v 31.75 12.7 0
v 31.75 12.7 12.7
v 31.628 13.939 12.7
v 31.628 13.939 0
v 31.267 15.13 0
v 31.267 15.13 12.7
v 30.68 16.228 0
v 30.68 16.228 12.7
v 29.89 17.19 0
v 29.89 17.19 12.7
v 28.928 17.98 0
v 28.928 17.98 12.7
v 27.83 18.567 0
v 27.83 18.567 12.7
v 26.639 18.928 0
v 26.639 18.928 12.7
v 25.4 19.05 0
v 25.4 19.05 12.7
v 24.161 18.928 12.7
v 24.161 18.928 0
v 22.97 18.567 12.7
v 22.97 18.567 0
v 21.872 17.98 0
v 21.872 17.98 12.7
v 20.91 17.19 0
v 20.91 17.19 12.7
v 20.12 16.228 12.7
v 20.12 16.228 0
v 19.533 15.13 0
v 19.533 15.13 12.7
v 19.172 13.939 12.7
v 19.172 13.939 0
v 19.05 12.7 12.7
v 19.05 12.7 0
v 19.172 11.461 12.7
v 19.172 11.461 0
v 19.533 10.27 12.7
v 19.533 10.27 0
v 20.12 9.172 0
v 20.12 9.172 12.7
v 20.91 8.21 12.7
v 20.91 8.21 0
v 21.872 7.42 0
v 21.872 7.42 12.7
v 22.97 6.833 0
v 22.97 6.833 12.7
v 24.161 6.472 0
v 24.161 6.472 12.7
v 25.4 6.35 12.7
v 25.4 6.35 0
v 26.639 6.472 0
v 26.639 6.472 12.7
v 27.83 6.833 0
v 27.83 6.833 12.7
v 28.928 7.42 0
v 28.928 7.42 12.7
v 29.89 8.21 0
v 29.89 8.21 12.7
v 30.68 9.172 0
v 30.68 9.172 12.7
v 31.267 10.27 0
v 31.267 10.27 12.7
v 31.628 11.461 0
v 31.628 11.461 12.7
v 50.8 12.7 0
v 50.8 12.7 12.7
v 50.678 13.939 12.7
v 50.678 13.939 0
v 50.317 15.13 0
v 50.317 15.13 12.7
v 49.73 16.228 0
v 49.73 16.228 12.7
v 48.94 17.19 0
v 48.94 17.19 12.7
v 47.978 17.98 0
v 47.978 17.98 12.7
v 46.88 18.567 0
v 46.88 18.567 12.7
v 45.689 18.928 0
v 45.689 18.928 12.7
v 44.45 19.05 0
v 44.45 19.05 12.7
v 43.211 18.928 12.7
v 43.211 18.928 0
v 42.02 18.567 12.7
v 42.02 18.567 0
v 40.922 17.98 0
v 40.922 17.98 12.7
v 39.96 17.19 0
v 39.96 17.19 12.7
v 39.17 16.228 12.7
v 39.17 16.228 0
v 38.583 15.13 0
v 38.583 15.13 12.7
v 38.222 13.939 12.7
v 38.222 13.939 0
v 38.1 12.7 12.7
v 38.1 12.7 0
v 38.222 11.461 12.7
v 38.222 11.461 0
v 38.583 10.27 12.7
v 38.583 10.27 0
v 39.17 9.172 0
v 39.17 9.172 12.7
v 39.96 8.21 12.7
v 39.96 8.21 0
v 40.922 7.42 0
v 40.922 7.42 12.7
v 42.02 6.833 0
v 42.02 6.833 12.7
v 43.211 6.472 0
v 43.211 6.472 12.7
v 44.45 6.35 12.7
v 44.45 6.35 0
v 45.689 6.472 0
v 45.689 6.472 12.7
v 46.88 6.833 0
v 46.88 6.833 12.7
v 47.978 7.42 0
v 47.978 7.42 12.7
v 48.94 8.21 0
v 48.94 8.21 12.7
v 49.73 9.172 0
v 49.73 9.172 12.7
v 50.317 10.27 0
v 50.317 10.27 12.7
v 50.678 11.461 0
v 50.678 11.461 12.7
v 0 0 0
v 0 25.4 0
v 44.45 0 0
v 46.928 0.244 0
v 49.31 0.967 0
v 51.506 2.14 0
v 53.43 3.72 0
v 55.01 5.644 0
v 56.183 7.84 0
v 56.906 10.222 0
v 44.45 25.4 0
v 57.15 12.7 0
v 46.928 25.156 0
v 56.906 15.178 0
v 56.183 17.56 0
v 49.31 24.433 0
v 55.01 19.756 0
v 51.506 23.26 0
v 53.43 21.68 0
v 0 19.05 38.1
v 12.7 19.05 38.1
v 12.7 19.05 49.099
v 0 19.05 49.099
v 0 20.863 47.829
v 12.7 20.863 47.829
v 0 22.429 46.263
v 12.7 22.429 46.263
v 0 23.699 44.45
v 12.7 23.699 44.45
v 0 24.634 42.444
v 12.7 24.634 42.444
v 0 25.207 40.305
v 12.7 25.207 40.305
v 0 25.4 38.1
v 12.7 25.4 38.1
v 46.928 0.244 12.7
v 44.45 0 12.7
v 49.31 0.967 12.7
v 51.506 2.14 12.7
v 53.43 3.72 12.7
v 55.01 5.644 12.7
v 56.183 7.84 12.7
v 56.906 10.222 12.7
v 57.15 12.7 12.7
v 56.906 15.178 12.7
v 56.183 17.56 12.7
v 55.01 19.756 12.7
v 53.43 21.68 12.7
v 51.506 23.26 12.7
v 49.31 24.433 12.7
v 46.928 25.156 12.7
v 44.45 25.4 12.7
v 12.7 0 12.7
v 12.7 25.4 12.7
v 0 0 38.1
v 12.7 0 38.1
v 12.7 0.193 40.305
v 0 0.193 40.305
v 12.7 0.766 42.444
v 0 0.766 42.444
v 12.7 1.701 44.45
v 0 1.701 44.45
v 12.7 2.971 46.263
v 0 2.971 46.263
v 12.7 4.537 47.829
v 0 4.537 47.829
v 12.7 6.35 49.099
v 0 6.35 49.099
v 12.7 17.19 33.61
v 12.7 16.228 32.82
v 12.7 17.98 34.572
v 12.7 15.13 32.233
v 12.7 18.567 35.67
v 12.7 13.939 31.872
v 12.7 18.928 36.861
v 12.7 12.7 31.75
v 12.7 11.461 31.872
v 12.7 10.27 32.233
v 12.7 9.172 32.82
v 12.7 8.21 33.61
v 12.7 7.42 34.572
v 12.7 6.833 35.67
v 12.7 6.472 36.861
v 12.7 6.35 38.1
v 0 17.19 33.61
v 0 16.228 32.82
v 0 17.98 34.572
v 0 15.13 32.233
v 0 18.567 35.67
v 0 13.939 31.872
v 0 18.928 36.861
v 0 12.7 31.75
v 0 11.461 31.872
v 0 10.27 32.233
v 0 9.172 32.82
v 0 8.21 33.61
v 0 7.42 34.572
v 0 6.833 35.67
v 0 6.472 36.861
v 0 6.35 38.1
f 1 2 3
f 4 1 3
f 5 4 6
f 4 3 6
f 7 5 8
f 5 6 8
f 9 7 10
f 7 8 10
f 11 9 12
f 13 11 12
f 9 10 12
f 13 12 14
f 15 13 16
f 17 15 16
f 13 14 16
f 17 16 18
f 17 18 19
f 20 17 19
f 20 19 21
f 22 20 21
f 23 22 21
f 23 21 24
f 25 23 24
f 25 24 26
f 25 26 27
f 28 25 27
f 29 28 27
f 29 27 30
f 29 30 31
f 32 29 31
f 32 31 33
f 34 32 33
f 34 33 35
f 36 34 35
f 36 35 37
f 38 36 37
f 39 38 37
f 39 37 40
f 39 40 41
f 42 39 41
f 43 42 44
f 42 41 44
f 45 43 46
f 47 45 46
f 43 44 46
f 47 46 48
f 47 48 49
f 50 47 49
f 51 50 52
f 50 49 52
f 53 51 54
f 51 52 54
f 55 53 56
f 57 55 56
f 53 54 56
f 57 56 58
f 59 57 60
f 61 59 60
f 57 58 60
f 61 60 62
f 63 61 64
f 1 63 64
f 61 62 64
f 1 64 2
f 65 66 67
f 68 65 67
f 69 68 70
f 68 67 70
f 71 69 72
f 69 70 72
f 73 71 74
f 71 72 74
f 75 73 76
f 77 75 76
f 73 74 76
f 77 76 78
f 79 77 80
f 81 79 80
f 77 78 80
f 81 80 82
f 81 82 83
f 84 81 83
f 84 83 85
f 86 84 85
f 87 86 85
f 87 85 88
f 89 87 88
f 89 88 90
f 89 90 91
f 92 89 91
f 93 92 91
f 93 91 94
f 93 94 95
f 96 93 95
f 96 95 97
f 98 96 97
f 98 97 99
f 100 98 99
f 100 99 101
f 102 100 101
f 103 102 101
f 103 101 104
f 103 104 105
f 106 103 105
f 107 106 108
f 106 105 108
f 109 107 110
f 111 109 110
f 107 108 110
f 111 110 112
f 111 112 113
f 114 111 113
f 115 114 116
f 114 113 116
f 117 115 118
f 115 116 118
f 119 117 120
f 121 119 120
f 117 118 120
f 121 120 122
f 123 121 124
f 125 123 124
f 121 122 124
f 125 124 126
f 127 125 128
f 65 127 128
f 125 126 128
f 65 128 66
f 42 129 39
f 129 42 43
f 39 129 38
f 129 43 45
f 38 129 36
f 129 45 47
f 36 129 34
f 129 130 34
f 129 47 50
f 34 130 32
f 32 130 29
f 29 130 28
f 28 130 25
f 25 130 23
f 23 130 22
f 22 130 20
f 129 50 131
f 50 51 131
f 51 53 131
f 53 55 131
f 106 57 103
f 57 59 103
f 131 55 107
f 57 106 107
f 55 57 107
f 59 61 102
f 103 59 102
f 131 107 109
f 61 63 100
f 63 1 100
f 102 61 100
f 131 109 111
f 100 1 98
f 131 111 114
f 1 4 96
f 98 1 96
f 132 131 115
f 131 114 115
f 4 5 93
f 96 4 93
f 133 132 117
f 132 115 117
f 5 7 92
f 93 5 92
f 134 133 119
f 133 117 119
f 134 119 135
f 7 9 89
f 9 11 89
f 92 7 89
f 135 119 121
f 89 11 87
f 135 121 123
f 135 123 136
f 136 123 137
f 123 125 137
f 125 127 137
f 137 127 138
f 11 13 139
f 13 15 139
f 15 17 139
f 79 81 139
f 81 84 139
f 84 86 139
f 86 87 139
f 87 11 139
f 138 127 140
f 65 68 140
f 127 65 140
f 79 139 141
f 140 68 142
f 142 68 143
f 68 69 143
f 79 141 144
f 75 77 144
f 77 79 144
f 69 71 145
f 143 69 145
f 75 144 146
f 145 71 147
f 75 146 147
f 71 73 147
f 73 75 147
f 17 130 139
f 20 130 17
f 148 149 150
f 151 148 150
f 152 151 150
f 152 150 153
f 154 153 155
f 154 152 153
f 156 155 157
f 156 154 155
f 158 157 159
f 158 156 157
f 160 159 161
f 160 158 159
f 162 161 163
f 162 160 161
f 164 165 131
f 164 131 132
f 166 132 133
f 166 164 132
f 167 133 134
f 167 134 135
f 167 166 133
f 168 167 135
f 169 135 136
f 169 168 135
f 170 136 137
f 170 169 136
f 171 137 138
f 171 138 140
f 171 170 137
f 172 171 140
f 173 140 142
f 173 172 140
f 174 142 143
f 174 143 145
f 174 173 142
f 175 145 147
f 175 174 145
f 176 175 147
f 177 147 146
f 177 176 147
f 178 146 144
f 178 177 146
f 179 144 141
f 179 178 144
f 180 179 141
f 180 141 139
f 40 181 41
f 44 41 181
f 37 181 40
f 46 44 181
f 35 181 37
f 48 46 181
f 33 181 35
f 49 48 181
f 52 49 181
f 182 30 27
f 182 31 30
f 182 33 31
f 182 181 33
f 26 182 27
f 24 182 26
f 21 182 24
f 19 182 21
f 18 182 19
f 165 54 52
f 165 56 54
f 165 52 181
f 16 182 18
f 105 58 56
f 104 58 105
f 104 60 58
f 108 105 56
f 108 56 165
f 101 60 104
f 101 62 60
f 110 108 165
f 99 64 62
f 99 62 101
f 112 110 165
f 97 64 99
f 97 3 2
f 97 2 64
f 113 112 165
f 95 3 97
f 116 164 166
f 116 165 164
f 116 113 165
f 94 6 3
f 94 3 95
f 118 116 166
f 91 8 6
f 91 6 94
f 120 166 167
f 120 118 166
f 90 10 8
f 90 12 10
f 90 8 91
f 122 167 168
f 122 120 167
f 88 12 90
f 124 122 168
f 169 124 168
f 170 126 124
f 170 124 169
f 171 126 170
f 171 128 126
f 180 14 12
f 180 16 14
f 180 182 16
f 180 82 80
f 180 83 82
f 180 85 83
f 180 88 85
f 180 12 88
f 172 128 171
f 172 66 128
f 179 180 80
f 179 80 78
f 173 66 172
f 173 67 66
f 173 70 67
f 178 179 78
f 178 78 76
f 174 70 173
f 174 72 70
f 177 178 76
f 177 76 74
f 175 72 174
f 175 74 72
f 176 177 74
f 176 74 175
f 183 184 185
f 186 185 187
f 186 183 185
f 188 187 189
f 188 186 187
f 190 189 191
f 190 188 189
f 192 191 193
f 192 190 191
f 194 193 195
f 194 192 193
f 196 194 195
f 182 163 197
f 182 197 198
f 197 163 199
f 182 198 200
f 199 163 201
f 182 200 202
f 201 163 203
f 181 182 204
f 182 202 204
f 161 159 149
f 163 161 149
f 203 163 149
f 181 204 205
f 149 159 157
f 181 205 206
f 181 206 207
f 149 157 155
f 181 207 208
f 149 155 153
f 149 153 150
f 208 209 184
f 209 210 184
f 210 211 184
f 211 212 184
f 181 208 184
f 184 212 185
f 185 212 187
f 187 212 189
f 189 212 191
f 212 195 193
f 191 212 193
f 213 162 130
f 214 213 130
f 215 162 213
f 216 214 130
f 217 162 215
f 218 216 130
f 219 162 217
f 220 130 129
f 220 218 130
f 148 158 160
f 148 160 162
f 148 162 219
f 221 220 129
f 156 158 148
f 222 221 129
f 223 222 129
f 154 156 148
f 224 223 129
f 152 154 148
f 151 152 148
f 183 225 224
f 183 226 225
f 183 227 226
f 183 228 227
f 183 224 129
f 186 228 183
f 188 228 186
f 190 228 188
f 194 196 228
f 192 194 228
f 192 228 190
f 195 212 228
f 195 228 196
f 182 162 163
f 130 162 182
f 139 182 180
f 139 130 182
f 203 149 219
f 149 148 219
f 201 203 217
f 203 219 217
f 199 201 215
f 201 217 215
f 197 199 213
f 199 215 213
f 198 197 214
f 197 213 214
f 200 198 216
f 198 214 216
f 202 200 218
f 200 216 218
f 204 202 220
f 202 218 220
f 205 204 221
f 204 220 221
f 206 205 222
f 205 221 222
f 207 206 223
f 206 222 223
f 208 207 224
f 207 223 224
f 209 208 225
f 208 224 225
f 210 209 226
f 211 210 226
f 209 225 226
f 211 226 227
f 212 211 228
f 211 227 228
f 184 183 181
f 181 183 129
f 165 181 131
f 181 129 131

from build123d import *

# Parameters (mm, degrees)
F0_W      = 44.45
F0_H      = 25.4
F1_DEPTH  = 12.7
F2_R      = 12.7
F3_DEPTH  = 12.7
F4_W      = 12.7
F4_H      = 25.4
F5_DEPTH  = 25.4
F6_R      = 12.7
F7_DEPTH  = 12.7
F8_R      = 6.35
F9_DEPTH  = 12.7
F10_W     = 12.7
F10_H     = 21.287267
F11_DEPTH = 25.4
F12_R     = 6.35
F13_DEPTH = 25.4


with BuildPart() as f1:
    # F0 (on Top) → F1 (new body)
    with BuildSketch(Plane.XY):
        with Locations((22.225, 12.7)):
            Rectangle(F0_W, F0_H)
    extrude(amount=F1_DEPTH)

    # F2 (on face) → F3 (join)
    with BuildSketch(Plane.XY.offset(12.7)):
        with Locations((44.45, 12.7)):
            Circle(F2_R)
    extrude(amount=-F3_DEPTH)

    # F4 (on face) → F5 (join)
    with BuildSketch(Plane.XY.offset(12.7)):
        with Locations((6.35, 12.7)):
            Rectangle(F4_W, F4_H)
    extrude(amount=F5_DEPTH)

    # F6 (on face) → F7 (join)
    with BuildSketch(Plane(origin=(0, 0, 0), x_dir=(0, -1, 0), z_dir=(-1, 0, 0))):
        with Locations((-12.7, 38.1)):
            Circle(F6_R)
    extrude(amount=-F7_DEPTH)

    # F8 (on face) → F9 (cut)
    with BuildSketch(Plane(origin=(0, 0, 0), x_dir=(0, -1, 0), z_dir=(-1, 0, 0))):
        with Locations((-12.7, 38.1)):
            Circle(F8_R)
    extrude(amount=-F9_DEPTH, mode=Mode.SUBTRACT)

    # F10 (on face) → F11 (cut)
    with BuildSketch(Plane.YZ.offset(12.7)):
        with Locations((12.7, 48.743634)):
            Rectangle(F10_W, F10_H)
    extrude(amount=-F11_DEPTH, mode=Mode.SUBTRACT)

    # F12 (on face) → F13 (cut)
    with BuildSketch(Plane.XY.offset(12.7)):
        with Locations((44.45, 12.7)):
            Circle(F12_R)
        with Locations((25.4, 12.7)):
            Circle(F12_R)
    extrude(amount=-F13_DEPTH, mode=Mode.SUBTRACT)


solid = f1.part
